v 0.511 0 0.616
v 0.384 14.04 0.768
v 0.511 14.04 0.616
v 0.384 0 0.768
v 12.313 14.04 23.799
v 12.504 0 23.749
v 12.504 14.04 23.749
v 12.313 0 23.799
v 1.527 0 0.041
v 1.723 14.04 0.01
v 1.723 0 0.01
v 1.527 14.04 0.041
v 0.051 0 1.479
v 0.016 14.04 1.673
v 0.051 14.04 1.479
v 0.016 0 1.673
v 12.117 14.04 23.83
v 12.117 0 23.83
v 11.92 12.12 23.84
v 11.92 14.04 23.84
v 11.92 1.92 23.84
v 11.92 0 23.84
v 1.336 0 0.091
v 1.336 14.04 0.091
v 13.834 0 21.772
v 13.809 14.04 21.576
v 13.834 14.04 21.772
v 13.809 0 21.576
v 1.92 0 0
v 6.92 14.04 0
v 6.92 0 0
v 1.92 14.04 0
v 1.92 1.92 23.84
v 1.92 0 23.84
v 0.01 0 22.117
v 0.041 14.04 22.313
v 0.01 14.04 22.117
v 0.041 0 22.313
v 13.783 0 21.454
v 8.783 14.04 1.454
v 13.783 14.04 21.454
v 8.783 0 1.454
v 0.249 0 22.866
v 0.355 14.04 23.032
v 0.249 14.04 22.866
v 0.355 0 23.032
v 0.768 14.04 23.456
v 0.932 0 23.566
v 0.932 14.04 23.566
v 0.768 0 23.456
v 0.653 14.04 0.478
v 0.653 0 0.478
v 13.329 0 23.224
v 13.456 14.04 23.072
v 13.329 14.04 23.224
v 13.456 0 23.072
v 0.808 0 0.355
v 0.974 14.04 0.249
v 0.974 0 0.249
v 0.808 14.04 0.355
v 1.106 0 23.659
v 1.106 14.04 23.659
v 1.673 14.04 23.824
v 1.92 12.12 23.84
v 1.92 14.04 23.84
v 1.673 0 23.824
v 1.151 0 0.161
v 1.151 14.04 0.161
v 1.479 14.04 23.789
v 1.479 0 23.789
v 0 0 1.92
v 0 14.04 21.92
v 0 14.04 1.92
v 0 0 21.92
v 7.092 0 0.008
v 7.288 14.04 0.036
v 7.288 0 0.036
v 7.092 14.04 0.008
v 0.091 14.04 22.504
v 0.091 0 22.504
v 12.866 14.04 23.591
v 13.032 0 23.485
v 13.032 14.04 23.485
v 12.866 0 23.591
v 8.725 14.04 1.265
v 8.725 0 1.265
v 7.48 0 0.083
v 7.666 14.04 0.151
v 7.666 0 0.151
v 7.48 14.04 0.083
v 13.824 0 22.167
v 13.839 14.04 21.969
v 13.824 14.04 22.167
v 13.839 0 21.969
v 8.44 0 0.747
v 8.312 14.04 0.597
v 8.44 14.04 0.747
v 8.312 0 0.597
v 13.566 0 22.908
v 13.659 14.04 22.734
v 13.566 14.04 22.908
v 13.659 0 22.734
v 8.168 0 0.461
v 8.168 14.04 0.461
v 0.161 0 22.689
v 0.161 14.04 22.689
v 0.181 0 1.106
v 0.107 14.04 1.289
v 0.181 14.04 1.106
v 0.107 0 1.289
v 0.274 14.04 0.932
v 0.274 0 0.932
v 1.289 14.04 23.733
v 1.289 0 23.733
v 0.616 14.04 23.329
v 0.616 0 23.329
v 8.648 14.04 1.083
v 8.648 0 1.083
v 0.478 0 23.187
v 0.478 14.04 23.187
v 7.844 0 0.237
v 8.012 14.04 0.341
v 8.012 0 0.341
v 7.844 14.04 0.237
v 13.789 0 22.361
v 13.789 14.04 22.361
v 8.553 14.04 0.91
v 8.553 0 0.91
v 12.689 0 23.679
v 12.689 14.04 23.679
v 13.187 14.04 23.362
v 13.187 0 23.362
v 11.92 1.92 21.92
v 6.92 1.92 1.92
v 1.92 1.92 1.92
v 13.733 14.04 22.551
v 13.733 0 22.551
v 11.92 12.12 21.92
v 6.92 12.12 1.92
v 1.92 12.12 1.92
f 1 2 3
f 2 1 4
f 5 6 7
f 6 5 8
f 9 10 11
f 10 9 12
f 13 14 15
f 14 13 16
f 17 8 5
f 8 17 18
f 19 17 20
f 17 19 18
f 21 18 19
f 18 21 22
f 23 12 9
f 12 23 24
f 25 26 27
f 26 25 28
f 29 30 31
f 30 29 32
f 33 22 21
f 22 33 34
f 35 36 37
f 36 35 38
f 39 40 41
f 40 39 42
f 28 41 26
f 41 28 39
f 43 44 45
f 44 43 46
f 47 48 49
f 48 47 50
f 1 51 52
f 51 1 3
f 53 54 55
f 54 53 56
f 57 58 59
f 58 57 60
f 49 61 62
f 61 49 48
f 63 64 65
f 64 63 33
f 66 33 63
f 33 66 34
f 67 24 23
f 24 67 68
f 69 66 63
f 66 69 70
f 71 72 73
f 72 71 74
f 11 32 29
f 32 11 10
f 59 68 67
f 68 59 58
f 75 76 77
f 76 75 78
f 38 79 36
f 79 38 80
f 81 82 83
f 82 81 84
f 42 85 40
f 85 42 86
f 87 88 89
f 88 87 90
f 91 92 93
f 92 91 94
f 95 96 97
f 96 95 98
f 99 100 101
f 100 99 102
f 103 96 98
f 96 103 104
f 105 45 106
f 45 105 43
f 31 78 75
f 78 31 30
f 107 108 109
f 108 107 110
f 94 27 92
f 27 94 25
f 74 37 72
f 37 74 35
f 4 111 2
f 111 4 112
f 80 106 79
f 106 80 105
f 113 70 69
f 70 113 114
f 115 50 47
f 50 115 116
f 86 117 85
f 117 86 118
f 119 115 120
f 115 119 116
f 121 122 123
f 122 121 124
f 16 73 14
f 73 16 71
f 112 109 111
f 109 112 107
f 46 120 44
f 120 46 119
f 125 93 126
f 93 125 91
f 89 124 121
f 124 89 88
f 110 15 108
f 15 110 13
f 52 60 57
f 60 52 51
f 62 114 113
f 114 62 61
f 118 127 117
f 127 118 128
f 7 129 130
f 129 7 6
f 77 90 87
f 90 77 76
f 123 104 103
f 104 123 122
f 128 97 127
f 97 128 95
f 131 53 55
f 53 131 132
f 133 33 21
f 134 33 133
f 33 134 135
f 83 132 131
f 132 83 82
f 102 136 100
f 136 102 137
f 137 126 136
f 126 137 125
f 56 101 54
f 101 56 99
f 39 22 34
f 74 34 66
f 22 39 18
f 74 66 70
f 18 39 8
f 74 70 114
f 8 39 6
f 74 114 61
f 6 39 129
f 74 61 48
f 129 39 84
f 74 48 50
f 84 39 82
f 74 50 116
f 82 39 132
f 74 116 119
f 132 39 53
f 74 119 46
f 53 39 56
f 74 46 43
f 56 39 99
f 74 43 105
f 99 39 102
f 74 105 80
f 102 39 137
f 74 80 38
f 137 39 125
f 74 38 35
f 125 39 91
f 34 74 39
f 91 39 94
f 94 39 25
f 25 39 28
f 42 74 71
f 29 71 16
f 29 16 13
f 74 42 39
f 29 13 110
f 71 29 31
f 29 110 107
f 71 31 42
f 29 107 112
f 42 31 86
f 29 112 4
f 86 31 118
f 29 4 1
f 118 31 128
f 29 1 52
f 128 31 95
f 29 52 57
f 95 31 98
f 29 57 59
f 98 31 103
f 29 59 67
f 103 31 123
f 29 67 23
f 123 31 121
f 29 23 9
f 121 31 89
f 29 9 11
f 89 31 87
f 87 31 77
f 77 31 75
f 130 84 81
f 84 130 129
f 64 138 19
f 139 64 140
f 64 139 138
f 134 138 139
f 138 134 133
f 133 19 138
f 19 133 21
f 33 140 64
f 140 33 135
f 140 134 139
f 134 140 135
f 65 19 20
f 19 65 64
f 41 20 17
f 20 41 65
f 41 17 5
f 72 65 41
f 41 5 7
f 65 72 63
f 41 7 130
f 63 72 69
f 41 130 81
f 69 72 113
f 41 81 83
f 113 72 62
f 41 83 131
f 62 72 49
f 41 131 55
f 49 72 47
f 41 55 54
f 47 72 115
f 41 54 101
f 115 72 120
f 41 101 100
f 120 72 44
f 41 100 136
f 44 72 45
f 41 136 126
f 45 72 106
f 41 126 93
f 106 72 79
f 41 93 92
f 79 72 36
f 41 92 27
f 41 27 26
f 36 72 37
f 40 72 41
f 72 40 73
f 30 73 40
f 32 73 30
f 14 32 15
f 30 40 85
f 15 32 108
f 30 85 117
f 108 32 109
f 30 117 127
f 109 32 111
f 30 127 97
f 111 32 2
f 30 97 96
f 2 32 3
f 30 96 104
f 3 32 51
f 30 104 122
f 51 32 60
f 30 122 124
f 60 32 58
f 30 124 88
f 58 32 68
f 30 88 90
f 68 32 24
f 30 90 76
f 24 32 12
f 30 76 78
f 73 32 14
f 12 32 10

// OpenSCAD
$fa = 0.2;
$fs = 0.2;
t = 0.48*4;
w = 10.2;

l = 20;
sw = 5;
bw = 10;
module shape() {
    polygon([
        [0,0],
        [bw,0],
        [sw,l],
        [0,l]
    ]);
}

module plier_softener() {
    translate([t,t,0]) {

        linear_extrude(t)
        offset(t)
        shape();

        translate([0,0,t])
        linear_extrude(w)
        difference() {
            offset(t)
            shape();
            shape();
            translate([0,-t])
            square([bw, t]);
        }

        translate([0,0,w+t])
        linear_extrude(t)
        offset(t)
        shape();
    }

}

translate([0,0,l+t*2])
rotate([-90,0,0])
plier_softener();

echo(sq = t*2+sw * t*2+w);
